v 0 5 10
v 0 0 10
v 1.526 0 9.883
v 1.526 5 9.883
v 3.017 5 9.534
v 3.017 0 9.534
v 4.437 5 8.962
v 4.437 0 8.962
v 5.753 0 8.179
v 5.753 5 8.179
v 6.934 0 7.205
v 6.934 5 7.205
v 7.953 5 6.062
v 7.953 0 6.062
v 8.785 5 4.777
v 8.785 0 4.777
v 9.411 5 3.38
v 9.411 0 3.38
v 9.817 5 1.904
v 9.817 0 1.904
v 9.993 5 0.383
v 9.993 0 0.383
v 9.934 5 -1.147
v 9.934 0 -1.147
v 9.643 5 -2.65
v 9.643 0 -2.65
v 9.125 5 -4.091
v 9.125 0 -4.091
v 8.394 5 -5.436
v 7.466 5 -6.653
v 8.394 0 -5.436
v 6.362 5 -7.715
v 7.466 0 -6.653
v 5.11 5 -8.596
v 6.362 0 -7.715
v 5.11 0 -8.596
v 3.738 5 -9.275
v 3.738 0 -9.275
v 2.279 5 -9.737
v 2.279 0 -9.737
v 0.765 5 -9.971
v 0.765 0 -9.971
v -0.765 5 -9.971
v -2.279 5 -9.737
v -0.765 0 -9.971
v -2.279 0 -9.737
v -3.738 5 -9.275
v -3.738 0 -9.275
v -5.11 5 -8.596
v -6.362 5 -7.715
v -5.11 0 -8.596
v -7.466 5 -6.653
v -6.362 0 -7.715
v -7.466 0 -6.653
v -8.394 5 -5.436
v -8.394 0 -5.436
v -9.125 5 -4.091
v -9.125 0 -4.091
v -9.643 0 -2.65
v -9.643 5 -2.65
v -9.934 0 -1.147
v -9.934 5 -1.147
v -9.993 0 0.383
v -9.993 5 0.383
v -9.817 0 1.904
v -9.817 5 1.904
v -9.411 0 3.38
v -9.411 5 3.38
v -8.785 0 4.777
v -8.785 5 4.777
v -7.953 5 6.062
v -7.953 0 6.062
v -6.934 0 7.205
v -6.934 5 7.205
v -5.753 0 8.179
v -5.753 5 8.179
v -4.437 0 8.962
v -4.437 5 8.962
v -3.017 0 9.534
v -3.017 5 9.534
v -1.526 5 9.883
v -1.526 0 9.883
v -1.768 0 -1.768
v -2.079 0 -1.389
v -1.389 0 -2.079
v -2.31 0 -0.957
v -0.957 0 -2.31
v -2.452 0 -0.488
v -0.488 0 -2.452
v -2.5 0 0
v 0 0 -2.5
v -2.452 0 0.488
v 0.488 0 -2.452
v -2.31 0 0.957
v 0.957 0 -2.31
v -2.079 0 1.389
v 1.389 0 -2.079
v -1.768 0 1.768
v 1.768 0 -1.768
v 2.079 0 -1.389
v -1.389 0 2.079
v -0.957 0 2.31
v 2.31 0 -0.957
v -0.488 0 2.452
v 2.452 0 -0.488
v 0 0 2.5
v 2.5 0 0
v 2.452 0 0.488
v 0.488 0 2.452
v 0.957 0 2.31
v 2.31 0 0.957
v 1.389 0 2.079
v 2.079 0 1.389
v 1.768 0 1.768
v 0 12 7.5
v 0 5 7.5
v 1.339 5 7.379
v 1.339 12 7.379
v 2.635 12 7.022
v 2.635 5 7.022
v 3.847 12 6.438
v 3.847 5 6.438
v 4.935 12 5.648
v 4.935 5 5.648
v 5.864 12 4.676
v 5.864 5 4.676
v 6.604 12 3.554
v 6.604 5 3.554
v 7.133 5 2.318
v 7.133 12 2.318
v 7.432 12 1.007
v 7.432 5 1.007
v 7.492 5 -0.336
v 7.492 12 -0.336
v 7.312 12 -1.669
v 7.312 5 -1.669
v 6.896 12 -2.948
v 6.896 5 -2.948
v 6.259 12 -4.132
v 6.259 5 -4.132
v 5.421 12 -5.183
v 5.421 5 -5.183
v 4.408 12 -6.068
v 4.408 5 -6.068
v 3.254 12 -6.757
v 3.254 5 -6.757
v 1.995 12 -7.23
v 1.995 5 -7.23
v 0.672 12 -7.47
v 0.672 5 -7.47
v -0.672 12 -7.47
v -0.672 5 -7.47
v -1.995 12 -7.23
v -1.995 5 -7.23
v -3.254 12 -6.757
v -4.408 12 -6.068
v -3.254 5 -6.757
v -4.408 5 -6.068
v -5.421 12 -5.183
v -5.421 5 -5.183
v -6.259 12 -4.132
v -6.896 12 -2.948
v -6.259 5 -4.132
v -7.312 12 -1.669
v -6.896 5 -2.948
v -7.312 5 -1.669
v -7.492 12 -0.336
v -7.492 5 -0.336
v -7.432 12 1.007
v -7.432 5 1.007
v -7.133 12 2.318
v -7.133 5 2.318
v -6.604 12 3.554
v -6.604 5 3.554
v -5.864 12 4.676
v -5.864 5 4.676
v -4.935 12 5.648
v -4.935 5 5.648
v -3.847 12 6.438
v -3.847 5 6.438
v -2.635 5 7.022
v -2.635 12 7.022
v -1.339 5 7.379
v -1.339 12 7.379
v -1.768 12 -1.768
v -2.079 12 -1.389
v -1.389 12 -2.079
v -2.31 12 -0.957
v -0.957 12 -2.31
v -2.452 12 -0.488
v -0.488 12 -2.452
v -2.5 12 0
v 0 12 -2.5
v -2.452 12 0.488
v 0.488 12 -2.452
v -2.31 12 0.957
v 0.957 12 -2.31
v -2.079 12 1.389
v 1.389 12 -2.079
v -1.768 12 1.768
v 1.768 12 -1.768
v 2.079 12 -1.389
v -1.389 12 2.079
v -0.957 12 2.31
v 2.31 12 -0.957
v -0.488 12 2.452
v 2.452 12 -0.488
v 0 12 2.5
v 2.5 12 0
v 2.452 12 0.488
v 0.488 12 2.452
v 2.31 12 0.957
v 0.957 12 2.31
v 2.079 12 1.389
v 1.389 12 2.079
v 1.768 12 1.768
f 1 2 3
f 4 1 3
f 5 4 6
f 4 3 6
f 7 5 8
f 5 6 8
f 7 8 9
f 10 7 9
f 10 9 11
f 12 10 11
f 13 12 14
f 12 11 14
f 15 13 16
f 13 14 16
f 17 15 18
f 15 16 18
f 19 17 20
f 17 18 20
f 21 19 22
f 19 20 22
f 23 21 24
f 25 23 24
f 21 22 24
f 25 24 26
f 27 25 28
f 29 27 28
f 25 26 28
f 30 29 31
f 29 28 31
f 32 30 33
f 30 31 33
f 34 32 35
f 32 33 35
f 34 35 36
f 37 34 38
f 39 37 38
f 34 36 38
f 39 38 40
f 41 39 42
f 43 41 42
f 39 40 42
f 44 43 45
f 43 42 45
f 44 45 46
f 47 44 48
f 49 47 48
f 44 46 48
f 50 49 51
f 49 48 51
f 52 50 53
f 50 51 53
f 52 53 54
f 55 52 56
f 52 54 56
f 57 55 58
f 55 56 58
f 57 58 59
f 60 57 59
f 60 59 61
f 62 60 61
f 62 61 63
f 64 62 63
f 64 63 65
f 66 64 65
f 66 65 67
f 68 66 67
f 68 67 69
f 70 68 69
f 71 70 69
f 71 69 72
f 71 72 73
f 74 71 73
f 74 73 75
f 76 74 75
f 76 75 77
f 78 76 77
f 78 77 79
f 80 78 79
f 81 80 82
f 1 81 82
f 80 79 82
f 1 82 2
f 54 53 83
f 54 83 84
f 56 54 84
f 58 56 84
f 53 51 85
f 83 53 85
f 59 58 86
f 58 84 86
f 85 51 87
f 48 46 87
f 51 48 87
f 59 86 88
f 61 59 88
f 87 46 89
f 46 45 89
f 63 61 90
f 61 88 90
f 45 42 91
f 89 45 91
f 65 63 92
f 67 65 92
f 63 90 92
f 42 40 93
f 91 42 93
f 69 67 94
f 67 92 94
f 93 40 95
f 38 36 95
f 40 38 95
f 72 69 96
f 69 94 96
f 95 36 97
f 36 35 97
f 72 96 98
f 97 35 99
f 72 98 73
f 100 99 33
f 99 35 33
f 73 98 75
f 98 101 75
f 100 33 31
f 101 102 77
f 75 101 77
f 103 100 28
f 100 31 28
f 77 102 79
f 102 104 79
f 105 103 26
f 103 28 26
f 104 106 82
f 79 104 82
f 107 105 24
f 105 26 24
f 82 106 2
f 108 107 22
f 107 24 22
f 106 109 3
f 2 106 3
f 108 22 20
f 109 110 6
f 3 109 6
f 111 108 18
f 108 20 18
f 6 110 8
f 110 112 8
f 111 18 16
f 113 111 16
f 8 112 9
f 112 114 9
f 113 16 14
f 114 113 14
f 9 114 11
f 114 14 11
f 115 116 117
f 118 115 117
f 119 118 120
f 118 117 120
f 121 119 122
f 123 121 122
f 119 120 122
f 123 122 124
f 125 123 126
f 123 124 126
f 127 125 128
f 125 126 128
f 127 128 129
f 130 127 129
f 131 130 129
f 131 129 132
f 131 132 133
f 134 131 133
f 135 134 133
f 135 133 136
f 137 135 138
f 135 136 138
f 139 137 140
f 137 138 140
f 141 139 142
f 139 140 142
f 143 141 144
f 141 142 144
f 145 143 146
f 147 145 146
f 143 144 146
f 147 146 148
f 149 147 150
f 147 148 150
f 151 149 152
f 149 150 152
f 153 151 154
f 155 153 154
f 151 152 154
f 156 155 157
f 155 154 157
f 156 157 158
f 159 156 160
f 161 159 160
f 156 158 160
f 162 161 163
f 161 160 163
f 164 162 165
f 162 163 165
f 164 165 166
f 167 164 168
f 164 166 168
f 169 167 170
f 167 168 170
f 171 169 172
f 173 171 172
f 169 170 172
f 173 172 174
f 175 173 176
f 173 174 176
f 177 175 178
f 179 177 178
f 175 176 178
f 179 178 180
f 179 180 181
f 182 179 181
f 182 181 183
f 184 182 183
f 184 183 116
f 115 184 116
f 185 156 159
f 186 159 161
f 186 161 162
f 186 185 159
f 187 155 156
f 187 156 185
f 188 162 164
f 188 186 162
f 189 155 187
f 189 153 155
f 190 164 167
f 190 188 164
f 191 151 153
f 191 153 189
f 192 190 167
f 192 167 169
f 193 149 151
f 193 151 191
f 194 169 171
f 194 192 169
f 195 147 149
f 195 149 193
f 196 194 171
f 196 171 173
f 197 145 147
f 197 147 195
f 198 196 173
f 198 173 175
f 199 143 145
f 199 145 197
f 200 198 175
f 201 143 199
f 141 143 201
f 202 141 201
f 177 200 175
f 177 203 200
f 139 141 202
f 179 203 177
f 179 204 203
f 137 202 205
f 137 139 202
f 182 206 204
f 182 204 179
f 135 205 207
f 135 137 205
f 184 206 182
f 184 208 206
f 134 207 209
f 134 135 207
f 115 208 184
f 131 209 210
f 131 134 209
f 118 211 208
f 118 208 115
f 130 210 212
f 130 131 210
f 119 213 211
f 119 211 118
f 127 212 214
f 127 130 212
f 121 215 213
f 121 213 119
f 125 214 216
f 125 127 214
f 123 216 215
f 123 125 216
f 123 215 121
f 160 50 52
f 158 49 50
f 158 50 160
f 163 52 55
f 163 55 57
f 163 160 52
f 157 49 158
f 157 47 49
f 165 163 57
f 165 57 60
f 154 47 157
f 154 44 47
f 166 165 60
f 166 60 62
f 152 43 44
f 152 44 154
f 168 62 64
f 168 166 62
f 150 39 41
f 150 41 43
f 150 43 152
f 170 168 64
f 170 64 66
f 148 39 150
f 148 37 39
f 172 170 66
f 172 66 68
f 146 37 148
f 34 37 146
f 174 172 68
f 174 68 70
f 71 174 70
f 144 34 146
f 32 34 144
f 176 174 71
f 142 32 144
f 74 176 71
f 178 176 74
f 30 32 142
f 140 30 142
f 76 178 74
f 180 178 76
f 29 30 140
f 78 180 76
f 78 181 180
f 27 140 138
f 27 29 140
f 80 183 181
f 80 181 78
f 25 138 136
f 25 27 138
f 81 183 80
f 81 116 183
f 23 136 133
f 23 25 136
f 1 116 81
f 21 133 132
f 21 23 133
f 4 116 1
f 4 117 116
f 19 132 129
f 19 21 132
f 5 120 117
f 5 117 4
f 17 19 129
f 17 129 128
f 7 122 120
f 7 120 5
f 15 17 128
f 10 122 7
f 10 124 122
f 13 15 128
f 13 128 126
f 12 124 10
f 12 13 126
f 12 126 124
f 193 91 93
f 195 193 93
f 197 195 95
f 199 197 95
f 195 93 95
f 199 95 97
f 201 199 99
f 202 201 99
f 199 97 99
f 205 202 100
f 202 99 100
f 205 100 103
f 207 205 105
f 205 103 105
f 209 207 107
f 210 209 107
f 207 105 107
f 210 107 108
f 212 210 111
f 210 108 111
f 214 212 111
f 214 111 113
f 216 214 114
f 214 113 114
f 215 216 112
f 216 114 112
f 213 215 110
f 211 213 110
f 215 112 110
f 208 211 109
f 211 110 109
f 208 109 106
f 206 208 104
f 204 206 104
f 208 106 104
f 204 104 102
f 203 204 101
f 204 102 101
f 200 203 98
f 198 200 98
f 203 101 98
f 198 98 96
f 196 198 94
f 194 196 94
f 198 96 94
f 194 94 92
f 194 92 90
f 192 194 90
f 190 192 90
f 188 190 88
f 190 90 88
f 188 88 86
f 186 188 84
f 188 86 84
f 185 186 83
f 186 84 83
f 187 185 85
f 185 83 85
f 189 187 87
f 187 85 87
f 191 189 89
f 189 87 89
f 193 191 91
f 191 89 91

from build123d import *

# Parameters (mm, degrees)
SKETCH_1_R          = 10
EXTRUDE_1_DEPTH     = 5
SKETCH_2_R          = 7.5
EXTRUDE_2_DEPTH     = 7
SKETCH_3_R          = 2.5
CUT_EXTRUDE_1_DEPTH = 12


with BuildPart() as part:
    # 草图1 → 凸台-拉伸1 (new body)
    with BuildSketch(Plane(origin=(0, 0, 0), x_dir=(1, 0, 0), z_dir=(0, 1, 0))):
        with Locations(Location((0, 0, 0), (0, 0, 270))):
            Circle(SKETCH_1_R)
    extrude(amount=EXTRUDE_1_DEPTH)

    # 草图2 → 凸台-拉伸2 (add)
    with BuildSketch(Plane(origin=(0, 5, 0), x_dir=(1, 0, 0), z_dir=(0, 1, 0))):
        with Locations(Location((0, 0, 0), (0, 0, 270))):
            Circle(SKETCH_2_R)
    extrude(amount=EXTRUDE_2_DEPTH)

    # 草图3 → 切除-拉伸1 (cut)
    with BuildSketch(Plane.XZ):
        with Locations(Location((0, 0, 0), (0, 0, 270))):
            Circle(SKETCH_3_R)
    extrude(amount=-CUT_EXTRUDE_1_DEPTH, mode=Mode.SUBTRACT)


solid = part.part
